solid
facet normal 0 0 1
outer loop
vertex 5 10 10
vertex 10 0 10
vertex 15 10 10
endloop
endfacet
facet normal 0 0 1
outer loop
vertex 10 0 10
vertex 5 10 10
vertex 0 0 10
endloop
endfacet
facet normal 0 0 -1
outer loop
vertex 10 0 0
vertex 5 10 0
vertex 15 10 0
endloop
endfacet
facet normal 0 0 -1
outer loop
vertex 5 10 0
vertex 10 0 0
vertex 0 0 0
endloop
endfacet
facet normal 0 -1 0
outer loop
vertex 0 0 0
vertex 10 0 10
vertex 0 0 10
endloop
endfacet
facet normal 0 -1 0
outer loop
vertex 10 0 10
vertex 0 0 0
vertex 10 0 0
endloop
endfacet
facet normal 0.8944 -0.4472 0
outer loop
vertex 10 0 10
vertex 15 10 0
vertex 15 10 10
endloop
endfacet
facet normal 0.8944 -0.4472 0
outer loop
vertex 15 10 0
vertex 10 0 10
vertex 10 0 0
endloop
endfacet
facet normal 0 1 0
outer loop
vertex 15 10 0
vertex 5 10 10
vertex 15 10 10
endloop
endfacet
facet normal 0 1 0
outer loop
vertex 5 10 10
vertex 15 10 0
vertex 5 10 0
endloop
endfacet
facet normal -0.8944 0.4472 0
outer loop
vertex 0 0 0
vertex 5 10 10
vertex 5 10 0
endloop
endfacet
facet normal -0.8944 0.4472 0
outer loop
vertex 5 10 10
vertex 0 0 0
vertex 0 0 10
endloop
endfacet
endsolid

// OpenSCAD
multmatrix([[1,0.5,0,0],[0,1,0,0],[0,0,1,0],[0,0,0,1]]) cube(10);
